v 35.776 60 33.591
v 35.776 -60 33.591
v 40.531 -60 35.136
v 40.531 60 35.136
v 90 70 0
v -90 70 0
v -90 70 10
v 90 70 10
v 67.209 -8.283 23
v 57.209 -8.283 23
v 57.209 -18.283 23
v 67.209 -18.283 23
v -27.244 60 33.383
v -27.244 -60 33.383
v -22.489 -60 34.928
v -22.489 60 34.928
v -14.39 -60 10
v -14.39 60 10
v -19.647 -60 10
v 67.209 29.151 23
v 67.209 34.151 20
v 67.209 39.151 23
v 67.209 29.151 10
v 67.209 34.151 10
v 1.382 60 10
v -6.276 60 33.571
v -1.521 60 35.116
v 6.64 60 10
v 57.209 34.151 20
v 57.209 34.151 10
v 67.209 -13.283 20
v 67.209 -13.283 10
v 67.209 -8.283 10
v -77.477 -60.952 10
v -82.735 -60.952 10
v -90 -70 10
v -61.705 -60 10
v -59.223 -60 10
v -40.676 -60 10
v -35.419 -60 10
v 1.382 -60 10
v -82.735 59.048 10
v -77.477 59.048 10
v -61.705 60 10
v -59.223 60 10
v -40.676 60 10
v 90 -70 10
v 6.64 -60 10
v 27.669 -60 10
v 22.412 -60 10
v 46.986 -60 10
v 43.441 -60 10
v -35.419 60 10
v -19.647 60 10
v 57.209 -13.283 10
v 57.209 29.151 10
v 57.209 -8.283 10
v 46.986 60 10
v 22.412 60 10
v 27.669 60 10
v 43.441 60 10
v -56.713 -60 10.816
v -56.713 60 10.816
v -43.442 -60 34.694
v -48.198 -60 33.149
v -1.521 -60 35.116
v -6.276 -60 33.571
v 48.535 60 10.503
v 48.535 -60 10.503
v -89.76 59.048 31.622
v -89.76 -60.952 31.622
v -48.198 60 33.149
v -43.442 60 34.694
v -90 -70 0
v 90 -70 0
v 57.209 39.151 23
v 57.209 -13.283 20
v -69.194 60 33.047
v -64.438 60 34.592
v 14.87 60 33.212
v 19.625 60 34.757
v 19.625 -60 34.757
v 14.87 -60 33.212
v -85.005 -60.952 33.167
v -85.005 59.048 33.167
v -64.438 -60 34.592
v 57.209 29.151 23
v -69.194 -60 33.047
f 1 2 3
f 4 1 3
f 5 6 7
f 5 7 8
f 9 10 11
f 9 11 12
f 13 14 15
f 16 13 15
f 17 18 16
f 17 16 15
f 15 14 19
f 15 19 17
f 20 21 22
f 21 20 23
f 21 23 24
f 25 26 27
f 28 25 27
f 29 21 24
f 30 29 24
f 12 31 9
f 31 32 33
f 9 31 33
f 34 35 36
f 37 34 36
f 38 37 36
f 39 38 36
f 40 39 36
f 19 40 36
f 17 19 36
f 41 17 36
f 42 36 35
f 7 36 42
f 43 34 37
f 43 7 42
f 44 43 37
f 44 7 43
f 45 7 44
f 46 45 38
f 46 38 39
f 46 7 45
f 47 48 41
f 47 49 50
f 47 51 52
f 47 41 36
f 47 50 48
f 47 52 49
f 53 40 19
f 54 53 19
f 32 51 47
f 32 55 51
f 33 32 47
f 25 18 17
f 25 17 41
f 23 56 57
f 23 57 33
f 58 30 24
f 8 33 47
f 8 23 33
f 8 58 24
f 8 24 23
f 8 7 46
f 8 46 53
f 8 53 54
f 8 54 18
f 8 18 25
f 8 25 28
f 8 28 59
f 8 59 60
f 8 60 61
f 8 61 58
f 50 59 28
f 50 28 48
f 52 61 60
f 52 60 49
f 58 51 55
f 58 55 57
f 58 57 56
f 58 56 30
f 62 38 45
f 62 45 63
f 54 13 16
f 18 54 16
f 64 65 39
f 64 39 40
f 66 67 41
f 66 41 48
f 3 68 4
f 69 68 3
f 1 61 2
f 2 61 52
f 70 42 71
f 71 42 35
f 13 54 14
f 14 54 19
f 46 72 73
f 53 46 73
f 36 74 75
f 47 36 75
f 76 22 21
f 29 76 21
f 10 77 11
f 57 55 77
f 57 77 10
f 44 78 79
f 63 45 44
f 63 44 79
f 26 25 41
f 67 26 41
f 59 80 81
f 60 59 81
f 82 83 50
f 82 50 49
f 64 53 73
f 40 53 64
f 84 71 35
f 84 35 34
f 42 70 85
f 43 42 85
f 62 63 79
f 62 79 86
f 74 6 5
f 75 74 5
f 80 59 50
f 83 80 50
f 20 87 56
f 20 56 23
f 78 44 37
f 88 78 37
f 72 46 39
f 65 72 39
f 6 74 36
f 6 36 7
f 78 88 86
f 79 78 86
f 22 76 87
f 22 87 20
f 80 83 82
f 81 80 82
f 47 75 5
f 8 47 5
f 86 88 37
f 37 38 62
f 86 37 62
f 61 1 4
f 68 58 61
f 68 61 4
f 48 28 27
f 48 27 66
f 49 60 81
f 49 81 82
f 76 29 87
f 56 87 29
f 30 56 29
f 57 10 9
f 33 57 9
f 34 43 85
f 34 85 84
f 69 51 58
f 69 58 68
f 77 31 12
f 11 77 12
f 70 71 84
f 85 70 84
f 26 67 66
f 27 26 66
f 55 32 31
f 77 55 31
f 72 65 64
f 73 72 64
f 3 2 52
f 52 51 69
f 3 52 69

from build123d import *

# Parameters (mm, degrees)
F2_W      = 5
F2_H      = 120
F3_DEPTH  = 30
F0_W      = 180
F0_H      = 140
F4_DEPTH  = 10
F5_W      = 5
F5_H      = 120
F6_DEPTH  = 25
F9_W      = 5
F9_H      = 120
F10_DEPTH = 27.9
F12_W     = 5
F12_H     = 120
F13_DEPTH = 33.6
F14_W     = 5
F14_H     = 120
F15_DEPTH = 27.3
F17_W     = 5
F17_H     = 120
F18_DEPTH = 32
F19_W     = 5
F19_H     = 120
F20_DEPTH = 25.9
F22_W     = 10
F22_H     = 10
F23_DEPTH = 13
F26_DEPTH = 15


with BuildPart() as f3:
    # F2 (on line) → F3 (new body)
    with BuildSketch(Plane(origin=(-8.5942352531, 0, 26.4503363532), x_dir=(0.9510565163, 0, 0.3090169944), z_dir=(0.3090169944, 0, -0.9510565163))):
        with Locations((-73.0950864666, 0.9517986327)):
            Rectangle(F2_W, F2_H)
    extrude(amount=-F3_DEPTH)

    # F0 (on Top) → F4 (join)
    with BuildSketch(Plane.XY):
        Rectangle(F0_W, F0_H)
    extrude(amount=F4_DEPTH)

    # F5 (on line) → F6 (join)
    with BuildSketch(Plane(origin=(-8.5942352531, 0, 26.4503363532), x_dir=(0.9510565163, 0, 0.3090169944), z_dir=(0.3090169944, 0, -0.9510565163))):
        with Locations((-53.0950864666, 0)):
            Rectangle(F5_W, F5_H)
    extrude(amount=-F6_DEPTH)

    # F9 (on line) → F10 (join)
    with BuildSketch(Plane(origin=(-5.7232027477, 0, 17.6142068765), x_dir=(0.9510565163, 0, 0.3090169944), z_dir=(0.3090169944, 0, -0.9510565163))):
        with Locations((-33.0950864666, 0)):
            Rectangle(F9_W, F9_H)
    extrude(amount=-F10_DEPTH)

    # F12 (on line) → F13 (join)
    with BuildSketch(Plane(origin=(-2.029499084, 0, 6.2461559196), x_dir=(0.9510565163, 0, 0.3090169944), z_dir=(0.3090169944, 0, -0.9510565163))):
        with Locations((-13.0950864666, 0)):
            Rectangle(F12_W, F12_H)
    extrude(amount=-F13_DEPTH)

    # F14 (on line) → F15 (join)
    with BuildSketch(Plane(origin=(-2.029499084, 0, 6.2461559196), x_dir=(0.9510565163, 0, 0.3090169944), z_dir=(0.3090169944, 0, -0.9510565163))):
        with Locations((6.9049135334, 0)):
            Rectangle(F14_W, F14_H)
    extrude(amount=-F15_DEPTH)

    # F17 (on line) → F18 (join)
    with BuildSketch(Plane(origin=(1.5478064215, 0, -4.7636583421), x_dir=(0.9510565163, 0, 0.3090169944), z_dir=(0.3090169944, 0, -0.9510565163))):
        with Locations((26.9049135334, 0)):
            Rectangle(F17_W, F17_H)
    extrude(amount=-F18_DEPTH)

    # F19 (on line) → F20 (join)
    with BuildSketch(Plane(origin=(1.5478064215, 0, -4.7636583421), x_dir=(0.9510565163, 0, 0.3090169944), z_dir=(0.3090169944, 0, -0.9510565163))):
        with Locations((46.9049135334, 0)):
            Rectangle(F19_W, F19_H)
    extrude(amount=-F20_DEPTH)

    # F22 (on offset) → F23 (join)
    with BuildSketch(Plane.XY.offset(10)):
        with Locations((62.2089297195, 34.1514503138)):
            Rectangle(F22_W, F22_H)
        with Locations((62.2089297195, -13.2830284653)):
            Rectangle(F22_W, F22_H)
    extrude(amount=F23_DEPTH)

    # F25 (on face) + F24 (on face) → F26 (cut)
    with BuildSketch(Plane.YZ.offset(67.2089297195)):
        Polygon((-13.2830284653, 20), (-18.2830284653, 23), (-18.2830284653, 10), (-13.2830284653, 10), align=None)
    with BuildSketch(Plane.YZ.offset(67.2089297195)):
        Polygon((39.1514503138, 10), (39.1514503138, 23), (34.1514503138, 20), (34.1514503138, 10), align=None)
    extrude(amount=-F26_DEPTH, mode=Mode.SUBTRACT)


solid = f3.part
